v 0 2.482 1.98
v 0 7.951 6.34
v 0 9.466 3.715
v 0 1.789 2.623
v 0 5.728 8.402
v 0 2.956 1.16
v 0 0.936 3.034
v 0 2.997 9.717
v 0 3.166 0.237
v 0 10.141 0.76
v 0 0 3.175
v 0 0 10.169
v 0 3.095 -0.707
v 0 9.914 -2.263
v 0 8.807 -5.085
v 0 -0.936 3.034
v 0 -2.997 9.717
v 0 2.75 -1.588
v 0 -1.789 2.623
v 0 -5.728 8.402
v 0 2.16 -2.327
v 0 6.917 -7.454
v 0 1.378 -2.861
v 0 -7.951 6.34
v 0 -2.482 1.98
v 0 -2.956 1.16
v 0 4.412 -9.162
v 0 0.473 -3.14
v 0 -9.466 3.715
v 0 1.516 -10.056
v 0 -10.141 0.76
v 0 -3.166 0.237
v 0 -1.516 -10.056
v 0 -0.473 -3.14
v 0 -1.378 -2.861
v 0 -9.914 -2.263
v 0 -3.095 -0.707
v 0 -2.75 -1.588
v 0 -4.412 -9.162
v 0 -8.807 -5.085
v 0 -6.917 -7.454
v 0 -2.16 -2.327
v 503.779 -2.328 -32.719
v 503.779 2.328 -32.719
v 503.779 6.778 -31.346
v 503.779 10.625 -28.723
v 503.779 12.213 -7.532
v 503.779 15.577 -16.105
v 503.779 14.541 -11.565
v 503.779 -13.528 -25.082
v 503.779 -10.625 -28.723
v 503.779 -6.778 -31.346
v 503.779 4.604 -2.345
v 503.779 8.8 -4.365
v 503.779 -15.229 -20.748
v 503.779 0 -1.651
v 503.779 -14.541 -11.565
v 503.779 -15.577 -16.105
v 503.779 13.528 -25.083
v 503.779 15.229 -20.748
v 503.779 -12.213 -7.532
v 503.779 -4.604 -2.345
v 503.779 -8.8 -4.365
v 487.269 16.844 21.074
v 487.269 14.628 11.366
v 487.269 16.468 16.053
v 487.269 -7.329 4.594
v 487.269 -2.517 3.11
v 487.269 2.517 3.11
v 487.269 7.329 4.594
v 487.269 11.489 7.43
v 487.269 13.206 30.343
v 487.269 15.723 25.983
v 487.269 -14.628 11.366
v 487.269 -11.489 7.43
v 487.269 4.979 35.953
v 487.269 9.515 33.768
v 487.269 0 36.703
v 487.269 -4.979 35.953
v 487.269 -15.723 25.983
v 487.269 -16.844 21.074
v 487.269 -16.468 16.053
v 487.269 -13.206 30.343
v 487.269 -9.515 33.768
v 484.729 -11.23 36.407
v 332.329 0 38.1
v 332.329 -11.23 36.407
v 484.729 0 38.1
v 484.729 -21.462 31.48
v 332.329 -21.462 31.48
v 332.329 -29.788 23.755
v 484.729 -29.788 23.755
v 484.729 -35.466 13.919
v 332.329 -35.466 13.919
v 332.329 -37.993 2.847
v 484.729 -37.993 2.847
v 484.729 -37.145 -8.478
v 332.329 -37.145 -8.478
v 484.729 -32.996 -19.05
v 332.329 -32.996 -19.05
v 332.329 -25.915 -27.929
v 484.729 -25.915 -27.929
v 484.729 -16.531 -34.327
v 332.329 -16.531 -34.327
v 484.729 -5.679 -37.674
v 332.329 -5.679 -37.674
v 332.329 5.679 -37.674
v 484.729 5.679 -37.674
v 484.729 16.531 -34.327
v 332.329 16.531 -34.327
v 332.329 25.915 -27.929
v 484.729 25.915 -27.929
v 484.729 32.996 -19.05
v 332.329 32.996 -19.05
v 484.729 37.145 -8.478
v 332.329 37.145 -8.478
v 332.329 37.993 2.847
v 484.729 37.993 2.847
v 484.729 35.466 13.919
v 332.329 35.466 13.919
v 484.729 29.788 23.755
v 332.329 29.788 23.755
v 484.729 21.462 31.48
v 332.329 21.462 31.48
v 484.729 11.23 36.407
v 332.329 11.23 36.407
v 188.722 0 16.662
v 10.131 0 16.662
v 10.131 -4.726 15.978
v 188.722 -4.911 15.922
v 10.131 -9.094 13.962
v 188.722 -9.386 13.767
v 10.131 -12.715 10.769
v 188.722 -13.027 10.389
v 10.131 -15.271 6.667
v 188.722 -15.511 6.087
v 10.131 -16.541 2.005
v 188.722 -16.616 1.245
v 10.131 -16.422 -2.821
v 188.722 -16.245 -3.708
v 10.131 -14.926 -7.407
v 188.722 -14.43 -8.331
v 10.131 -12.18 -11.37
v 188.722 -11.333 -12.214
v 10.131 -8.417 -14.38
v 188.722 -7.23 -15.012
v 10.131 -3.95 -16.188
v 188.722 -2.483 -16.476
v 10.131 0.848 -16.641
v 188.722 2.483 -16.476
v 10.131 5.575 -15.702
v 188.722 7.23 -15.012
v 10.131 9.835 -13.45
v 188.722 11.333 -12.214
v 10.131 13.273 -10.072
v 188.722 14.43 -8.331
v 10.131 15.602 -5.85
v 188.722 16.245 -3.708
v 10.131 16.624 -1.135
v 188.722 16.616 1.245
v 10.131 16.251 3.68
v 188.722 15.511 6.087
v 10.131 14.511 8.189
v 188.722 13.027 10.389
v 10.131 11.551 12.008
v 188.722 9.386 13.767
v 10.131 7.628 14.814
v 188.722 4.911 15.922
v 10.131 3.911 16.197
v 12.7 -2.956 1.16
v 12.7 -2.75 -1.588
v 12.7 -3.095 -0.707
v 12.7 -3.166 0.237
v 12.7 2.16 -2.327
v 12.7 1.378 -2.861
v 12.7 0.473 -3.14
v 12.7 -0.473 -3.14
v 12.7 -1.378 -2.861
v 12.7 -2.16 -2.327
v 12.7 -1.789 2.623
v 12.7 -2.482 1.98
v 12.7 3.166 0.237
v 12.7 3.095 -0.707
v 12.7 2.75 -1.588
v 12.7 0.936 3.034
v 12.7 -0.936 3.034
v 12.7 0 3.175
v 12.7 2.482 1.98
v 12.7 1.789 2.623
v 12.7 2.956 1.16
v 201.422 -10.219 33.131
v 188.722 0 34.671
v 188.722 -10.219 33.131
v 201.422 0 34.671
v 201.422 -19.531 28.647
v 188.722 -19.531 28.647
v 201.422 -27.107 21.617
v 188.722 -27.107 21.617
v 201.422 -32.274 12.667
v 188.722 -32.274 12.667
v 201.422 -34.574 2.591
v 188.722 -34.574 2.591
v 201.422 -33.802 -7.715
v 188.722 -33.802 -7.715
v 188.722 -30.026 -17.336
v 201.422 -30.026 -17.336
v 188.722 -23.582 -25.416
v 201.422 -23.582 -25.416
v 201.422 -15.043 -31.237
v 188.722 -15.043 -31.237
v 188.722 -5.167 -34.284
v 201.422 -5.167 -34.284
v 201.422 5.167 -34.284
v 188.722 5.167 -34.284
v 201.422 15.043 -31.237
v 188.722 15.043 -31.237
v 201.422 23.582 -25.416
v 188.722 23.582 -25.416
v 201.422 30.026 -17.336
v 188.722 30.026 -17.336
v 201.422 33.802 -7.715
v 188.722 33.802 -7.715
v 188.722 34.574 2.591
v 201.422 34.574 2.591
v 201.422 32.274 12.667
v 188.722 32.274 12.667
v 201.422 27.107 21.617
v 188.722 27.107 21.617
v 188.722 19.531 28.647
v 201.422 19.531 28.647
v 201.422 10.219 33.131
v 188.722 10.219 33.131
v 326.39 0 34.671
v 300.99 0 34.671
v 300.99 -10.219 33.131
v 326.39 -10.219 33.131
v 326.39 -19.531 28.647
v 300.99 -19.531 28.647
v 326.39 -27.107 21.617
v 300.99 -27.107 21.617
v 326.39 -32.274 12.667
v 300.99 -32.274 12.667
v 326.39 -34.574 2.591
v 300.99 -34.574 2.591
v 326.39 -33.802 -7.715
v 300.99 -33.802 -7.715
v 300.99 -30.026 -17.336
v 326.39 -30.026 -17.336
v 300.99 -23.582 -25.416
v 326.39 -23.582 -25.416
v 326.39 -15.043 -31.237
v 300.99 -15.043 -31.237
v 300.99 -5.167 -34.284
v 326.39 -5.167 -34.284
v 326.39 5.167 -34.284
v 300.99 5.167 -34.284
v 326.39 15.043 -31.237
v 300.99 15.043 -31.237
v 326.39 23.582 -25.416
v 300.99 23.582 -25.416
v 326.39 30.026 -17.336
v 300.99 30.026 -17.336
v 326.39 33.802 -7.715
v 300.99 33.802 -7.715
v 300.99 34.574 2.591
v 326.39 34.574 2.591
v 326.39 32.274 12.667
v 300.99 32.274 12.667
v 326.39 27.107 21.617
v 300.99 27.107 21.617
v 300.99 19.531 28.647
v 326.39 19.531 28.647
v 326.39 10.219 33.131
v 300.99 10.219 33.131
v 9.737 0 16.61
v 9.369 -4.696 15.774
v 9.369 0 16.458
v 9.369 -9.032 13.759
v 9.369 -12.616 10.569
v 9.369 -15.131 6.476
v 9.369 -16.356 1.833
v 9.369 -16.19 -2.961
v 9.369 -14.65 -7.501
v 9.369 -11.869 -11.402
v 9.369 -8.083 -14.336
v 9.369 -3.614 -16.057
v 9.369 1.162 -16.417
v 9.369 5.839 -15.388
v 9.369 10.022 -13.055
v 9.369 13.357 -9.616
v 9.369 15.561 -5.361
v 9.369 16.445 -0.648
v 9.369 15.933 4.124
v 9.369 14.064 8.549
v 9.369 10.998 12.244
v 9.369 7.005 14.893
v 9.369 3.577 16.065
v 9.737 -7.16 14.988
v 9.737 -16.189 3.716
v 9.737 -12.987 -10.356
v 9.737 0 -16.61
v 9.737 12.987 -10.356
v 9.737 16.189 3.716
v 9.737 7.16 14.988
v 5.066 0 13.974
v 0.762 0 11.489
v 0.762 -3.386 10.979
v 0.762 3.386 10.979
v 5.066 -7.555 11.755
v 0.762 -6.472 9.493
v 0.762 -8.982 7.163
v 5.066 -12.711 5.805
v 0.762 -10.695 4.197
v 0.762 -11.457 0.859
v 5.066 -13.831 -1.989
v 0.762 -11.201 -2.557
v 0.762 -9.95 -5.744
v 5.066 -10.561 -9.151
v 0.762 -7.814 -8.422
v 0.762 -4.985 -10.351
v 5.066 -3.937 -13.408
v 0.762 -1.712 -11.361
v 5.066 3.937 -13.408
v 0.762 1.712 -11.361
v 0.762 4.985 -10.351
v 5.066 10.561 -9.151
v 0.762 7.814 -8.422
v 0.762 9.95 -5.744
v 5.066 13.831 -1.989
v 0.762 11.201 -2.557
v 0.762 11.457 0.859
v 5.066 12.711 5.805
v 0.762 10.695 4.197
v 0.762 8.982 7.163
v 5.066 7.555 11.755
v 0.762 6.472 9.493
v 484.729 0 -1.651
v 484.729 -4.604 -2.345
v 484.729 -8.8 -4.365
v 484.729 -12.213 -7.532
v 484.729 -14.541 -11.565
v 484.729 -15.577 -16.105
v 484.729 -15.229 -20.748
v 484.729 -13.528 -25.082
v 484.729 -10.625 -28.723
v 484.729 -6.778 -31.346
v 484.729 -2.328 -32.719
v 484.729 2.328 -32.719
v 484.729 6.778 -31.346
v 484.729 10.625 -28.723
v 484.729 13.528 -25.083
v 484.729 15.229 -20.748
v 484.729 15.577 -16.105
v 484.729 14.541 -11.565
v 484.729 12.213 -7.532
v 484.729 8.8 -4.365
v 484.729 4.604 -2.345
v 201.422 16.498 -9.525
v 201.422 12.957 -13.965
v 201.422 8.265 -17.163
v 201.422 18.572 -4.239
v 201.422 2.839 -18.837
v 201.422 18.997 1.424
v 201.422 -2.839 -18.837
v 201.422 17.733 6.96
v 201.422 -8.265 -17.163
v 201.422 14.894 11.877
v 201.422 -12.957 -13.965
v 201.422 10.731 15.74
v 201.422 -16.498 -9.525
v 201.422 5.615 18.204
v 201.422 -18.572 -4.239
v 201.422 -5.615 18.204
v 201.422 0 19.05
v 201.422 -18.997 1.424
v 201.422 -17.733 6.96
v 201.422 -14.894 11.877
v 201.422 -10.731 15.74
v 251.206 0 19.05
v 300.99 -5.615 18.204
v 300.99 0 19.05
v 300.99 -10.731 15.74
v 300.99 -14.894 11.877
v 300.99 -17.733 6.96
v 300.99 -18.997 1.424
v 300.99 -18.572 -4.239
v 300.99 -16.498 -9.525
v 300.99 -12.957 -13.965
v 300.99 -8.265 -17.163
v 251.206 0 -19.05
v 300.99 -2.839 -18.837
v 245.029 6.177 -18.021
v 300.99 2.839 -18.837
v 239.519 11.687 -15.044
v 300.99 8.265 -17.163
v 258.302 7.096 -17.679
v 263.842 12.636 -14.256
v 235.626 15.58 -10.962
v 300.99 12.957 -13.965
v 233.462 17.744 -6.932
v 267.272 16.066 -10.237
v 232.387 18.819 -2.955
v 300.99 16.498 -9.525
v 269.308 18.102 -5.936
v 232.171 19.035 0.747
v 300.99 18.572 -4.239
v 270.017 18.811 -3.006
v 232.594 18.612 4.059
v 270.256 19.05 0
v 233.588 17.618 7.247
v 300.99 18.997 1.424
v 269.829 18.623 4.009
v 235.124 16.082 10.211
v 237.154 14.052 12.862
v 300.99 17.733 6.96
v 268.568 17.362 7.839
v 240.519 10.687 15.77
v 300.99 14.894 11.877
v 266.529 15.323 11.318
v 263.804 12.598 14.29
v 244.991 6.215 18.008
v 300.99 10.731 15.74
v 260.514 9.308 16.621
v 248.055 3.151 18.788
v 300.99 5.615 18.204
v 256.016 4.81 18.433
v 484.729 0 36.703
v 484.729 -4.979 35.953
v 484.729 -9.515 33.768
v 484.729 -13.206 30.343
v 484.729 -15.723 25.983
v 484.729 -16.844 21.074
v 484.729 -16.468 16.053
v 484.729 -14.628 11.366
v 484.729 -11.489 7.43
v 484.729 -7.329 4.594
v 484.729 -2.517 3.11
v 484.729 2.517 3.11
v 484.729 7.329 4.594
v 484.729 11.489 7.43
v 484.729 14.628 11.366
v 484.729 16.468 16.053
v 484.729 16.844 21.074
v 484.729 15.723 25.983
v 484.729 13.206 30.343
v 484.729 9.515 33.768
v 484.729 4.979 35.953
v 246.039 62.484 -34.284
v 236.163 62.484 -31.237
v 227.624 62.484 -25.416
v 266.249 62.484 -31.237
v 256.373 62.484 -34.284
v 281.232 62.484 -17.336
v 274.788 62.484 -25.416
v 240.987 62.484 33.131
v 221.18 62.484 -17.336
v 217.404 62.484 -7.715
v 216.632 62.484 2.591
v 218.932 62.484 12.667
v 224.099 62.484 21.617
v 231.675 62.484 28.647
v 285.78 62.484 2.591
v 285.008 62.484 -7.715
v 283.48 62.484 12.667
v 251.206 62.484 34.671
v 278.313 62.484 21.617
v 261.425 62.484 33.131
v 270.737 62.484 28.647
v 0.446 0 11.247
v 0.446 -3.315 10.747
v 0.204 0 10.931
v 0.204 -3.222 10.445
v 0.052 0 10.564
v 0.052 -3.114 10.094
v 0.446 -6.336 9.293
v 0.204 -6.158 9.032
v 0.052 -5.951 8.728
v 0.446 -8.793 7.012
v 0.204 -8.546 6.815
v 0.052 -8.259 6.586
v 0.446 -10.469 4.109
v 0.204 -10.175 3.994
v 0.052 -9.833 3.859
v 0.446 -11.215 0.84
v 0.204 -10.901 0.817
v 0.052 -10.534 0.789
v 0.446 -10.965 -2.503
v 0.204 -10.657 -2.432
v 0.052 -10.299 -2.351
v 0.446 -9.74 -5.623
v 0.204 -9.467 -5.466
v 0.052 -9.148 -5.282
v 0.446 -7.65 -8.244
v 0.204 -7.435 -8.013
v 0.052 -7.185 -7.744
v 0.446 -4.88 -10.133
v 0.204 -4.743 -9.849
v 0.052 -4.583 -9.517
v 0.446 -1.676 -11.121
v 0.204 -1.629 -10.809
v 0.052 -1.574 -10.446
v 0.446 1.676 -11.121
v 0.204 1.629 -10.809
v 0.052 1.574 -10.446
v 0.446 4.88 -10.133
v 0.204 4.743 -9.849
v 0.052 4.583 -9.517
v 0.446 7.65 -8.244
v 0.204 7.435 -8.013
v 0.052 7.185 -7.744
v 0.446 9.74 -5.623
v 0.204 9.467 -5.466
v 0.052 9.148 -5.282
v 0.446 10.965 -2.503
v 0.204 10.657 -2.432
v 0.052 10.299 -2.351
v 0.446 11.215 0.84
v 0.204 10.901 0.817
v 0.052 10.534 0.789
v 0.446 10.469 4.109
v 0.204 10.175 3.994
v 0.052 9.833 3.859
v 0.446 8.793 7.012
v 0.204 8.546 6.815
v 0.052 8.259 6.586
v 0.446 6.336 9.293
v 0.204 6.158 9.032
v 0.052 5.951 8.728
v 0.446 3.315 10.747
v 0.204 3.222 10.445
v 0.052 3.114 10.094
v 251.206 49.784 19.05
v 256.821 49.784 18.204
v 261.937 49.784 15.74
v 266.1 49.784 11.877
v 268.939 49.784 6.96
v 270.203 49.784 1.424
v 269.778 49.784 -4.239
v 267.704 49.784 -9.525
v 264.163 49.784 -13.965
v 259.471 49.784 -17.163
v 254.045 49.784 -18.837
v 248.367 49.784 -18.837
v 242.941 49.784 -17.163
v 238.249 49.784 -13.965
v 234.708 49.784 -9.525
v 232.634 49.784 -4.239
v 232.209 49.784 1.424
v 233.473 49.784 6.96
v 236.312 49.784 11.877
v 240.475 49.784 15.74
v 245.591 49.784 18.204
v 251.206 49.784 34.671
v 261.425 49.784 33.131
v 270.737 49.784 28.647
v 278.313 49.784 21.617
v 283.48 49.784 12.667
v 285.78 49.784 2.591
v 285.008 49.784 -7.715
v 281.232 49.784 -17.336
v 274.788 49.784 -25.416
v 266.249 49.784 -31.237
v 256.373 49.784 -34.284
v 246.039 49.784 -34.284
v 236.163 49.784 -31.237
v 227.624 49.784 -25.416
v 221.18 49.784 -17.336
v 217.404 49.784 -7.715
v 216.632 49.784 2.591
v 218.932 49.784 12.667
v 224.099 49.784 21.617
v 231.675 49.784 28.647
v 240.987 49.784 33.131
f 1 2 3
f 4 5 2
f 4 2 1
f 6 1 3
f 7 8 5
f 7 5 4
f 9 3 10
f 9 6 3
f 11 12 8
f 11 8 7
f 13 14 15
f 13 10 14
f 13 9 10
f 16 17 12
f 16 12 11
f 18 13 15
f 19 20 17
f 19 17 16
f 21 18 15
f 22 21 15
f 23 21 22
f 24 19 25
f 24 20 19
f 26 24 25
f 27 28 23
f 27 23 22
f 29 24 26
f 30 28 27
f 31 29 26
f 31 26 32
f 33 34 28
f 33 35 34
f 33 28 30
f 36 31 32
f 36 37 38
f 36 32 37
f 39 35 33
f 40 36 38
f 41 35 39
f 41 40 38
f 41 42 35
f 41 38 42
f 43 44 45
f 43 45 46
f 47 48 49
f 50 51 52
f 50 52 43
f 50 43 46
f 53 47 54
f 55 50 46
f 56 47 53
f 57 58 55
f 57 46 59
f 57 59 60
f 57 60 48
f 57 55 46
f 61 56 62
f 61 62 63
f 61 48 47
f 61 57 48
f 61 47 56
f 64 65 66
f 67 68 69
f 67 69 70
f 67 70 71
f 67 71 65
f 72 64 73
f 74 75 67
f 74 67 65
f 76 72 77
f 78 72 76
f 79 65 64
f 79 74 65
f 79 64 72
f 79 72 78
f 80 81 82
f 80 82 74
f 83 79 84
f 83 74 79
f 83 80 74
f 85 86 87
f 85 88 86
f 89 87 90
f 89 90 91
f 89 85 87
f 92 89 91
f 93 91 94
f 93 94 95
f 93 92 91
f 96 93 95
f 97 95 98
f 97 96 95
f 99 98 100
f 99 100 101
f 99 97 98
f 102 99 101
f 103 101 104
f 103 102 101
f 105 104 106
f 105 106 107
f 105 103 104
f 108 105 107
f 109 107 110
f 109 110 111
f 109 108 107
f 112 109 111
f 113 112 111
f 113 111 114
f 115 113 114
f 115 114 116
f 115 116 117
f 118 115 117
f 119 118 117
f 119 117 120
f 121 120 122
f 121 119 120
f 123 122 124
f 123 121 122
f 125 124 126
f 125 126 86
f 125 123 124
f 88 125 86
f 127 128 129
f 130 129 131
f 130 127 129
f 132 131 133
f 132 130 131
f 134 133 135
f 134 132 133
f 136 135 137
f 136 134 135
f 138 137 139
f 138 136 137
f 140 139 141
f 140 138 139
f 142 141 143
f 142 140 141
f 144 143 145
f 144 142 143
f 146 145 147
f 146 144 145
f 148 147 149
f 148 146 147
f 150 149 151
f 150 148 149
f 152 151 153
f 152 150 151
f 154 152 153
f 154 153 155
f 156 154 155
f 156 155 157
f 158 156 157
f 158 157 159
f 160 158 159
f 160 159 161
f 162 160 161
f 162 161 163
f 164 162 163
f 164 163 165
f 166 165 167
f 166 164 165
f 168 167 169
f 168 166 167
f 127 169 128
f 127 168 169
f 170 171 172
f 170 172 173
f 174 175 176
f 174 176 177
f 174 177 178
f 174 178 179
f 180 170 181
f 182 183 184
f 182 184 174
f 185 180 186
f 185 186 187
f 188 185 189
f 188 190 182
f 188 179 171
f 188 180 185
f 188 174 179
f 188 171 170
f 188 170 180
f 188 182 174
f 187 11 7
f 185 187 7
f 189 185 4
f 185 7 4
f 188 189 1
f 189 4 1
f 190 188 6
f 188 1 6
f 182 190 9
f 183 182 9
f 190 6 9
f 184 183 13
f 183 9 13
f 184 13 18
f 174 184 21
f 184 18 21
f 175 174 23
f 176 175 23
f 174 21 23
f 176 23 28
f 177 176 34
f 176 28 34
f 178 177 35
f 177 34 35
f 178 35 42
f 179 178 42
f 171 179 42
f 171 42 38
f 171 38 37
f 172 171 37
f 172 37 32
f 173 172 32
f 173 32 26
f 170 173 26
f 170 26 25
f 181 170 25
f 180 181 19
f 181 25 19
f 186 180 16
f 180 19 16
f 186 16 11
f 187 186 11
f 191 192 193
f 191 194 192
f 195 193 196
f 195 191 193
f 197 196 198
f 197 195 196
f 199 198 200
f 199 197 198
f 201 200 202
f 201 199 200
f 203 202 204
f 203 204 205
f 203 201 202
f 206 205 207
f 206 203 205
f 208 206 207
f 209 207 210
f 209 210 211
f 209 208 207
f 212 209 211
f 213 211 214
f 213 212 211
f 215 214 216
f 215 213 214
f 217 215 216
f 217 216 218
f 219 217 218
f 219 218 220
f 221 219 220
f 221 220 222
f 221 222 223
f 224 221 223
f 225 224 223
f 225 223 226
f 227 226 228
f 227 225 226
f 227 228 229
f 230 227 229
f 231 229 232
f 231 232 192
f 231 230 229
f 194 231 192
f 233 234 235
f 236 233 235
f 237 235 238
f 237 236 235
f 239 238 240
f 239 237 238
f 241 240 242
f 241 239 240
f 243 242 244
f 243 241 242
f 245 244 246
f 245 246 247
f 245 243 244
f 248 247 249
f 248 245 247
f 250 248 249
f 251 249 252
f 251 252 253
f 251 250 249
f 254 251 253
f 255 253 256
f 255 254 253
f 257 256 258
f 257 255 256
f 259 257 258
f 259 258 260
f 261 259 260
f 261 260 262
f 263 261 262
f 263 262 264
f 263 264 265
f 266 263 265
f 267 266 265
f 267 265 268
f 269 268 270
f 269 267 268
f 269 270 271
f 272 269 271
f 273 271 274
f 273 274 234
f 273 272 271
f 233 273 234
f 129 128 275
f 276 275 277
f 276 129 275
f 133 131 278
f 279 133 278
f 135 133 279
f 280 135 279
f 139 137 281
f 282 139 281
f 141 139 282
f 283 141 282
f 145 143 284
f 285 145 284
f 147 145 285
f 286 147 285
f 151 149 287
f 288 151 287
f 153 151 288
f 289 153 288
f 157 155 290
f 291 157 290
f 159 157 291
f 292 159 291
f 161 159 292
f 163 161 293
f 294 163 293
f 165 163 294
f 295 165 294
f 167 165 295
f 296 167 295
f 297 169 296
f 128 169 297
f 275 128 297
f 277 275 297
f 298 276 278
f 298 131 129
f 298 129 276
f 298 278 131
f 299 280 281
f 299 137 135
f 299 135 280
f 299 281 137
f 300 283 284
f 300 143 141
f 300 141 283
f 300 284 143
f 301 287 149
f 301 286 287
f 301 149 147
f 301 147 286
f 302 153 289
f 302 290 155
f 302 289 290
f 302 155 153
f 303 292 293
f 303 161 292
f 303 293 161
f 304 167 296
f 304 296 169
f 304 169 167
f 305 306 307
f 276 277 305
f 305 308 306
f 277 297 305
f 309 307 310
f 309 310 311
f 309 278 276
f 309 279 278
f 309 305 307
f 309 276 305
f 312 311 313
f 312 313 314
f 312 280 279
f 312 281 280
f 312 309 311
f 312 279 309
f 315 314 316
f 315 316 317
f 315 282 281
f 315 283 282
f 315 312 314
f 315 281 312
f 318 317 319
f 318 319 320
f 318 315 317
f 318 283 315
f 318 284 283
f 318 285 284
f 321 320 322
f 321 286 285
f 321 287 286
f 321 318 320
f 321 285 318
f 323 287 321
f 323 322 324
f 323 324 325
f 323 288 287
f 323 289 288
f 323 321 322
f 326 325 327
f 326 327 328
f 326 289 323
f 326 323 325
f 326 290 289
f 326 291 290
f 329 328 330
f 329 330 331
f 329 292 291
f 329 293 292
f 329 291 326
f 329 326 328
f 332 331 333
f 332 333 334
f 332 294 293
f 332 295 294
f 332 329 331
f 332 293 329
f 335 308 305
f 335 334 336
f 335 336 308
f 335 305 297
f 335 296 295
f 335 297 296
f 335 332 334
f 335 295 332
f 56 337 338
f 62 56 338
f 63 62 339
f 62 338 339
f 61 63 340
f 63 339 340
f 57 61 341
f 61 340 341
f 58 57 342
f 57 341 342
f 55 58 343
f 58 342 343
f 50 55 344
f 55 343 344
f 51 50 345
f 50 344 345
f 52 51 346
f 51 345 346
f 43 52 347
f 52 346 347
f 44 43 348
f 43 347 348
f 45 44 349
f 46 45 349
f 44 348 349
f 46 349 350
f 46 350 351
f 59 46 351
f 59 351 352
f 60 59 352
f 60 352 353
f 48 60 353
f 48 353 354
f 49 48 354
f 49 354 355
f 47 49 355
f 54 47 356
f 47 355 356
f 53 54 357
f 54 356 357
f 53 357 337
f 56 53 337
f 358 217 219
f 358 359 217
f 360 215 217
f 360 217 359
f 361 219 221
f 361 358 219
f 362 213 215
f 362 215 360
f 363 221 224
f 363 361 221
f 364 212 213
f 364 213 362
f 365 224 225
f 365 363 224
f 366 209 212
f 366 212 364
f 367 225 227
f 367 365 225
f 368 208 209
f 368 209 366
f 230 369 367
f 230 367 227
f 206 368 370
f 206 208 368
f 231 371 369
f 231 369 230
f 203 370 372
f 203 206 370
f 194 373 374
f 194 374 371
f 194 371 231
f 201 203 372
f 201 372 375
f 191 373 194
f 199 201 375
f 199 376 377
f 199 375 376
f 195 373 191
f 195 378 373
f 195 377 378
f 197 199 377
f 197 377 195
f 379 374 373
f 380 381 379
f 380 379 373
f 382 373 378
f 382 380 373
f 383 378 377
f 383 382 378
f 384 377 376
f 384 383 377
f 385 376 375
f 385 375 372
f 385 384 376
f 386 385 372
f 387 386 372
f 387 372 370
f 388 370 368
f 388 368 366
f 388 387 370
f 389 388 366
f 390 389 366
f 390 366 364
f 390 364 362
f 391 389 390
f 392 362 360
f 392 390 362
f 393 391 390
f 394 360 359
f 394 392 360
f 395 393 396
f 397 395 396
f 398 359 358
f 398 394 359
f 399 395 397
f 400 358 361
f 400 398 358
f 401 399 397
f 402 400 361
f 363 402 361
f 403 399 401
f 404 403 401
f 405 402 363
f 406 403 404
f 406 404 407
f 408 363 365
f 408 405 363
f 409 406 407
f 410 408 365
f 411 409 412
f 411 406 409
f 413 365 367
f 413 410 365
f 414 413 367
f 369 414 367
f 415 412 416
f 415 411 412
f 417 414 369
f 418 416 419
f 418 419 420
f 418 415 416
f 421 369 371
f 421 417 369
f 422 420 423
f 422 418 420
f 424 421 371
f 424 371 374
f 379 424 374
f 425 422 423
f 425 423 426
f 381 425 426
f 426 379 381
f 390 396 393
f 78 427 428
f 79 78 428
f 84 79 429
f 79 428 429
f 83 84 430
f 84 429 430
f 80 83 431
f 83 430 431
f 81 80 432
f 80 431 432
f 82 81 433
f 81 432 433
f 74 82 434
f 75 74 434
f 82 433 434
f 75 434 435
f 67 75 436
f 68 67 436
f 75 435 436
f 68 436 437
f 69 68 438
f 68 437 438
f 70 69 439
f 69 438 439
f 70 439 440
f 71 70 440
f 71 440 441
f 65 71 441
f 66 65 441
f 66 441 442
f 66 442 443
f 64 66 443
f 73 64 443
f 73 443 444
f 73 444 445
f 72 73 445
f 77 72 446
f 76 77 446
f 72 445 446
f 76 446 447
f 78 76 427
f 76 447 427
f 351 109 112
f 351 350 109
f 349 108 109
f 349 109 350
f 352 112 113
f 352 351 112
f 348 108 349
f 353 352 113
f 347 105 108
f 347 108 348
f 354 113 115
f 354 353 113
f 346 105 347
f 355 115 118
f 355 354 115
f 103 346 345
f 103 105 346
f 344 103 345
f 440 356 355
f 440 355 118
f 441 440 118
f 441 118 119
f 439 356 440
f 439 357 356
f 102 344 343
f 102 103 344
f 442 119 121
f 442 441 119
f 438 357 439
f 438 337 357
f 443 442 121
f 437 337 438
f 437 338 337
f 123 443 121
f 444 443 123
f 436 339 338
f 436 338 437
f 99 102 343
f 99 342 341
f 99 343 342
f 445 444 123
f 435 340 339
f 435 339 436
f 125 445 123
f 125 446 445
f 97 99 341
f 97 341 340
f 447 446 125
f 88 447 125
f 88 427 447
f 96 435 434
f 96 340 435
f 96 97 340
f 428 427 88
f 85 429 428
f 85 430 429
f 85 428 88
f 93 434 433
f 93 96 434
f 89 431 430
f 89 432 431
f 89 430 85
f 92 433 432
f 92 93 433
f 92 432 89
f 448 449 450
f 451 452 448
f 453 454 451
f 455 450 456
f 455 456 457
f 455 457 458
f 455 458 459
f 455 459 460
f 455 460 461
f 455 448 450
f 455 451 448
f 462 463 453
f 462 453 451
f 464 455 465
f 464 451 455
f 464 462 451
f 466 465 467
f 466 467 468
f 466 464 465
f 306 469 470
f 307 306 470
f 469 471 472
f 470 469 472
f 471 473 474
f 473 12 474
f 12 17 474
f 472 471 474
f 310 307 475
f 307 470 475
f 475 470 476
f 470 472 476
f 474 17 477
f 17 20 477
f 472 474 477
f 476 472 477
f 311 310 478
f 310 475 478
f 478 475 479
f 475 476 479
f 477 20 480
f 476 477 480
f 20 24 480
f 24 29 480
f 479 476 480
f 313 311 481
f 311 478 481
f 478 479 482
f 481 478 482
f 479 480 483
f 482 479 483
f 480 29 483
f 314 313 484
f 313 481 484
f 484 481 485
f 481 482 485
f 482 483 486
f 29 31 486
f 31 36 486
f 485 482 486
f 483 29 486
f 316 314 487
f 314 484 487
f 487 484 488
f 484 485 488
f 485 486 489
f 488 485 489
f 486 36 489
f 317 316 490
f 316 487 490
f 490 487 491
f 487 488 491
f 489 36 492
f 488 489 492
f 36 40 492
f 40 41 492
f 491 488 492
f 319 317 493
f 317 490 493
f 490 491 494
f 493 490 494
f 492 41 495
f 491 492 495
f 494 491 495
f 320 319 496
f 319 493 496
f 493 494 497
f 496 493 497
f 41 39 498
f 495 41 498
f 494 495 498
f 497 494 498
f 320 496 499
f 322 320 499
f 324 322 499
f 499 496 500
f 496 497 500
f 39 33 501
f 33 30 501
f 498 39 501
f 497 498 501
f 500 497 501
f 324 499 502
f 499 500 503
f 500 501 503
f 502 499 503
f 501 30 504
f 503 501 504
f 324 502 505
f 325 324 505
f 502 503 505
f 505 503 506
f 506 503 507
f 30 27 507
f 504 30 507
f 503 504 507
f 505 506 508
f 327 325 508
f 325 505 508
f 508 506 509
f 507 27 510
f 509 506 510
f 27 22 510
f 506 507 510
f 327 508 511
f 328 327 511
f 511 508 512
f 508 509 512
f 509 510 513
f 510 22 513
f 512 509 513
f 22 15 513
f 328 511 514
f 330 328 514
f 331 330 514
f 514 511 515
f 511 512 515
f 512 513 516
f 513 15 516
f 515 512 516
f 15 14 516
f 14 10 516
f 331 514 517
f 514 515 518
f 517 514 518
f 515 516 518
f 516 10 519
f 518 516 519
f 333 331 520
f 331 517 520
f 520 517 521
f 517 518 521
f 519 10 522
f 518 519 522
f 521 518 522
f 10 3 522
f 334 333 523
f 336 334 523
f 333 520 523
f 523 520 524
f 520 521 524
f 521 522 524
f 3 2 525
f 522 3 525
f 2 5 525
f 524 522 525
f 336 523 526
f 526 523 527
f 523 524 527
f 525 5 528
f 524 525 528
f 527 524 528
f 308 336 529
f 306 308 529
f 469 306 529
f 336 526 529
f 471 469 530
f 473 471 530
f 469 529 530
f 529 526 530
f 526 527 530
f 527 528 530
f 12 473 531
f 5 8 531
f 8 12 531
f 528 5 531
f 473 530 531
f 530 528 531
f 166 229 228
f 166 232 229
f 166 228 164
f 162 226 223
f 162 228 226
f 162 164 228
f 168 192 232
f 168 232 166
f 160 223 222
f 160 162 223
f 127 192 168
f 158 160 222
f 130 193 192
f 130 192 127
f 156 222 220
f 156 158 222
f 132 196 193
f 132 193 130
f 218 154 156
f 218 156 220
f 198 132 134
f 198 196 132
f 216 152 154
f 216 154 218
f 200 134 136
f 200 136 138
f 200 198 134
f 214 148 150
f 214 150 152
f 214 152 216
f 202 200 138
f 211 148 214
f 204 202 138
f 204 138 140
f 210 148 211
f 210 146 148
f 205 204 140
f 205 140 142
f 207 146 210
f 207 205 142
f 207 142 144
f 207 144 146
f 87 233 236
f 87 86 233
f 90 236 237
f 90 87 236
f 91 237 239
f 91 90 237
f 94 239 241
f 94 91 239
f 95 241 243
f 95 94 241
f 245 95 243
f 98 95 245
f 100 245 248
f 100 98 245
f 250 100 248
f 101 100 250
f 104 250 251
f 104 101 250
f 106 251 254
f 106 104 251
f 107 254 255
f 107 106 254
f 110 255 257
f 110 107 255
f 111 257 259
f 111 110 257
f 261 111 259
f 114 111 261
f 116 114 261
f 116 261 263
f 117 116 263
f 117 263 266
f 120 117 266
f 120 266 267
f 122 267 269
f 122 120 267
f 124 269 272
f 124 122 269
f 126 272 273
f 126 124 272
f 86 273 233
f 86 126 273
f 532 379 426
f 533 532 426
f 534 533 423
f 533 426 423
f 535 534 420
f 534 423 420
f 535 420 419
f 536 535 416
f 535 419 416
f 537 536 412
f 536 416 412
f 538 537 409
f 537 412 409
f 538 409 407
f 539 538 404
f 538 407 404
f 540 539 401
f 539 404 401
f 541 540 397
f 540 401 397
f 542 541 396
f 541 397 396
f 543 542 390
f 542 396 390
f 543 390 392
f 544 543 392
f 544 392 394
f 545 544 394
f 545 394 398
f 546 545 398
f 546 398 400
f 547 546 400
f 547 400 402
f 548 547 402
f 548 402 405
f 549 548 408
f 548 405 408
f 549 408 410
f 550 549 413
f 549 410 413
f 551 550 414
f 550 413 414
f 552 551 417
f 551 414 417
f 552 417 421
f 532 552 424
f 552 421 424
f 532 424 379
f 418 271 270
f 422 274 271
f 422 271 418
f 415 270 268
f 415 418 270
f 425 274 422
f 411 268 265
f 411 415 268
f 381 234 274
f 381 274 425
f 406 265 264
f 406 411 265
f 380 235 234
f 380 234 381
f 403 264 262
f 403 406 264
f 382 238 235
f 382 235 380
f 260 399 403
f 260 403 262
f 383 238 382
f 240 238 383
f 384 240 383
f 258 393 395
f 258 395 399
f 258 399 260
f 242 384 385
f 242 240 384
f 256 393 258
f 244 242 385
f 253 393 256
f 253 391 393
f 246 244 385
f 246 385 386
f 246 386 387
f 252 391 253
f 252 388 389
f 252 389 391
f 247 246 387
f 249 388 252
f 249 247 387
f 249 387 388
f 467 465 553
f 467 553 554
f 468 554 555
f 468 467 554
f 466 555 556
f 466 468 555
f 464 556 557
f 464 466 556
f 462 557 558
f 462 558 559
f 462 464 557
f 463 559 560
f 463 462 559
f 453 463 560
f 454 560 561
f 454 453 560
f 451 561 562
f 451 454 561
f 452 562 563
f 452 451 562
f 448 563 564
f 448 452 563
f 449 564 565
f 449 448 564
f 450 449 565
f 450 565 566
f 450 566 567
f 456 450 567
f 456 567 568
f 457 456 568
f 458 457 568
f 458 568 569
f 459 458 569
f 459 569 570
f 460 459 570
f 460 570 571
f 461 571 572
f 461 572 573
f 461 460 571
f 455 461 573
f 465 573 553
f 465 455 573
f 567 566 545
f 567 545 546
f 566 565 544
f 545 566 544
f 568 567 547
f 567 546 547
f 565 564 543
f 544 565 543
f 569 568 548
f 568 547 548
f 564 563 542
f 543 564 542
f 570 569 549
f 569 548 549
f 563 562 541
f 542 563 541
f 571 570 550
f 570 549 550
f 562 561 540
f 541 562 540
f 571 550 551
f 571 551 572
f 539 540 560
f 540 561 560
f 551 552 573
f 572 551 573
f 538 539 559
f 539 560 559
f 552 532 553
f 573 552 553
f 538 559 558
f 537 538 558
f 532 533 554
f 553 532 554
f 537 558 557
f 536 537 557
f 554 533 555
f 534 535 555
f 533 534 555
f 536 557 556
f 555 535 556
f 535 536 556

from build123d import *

# Parameters (mm, degrees)
SKETCH2_R           = 19.05
BOSS_EXTRUDE1_DEPTH = 62.484
SKETCH3_R           = 34.671
BOSS_EXTRUDE2_DEPTH = 12.7
SKETCH4_R           = 15.621
BOSS_EXTRUDE3_DEPTH = 19.05
SKETCH5_R           = 16.891
BOSS_EXTRUDE4_DEPTH = 2.54
FILLET1_R           = 1.524
SKETCH6_R           = 3.175
CUT_EXTRUDE1_DEPTH  = 12.7


with BuildPart() as part:
    # Sketch1 → Revolve1 (revolve)
    with BuildSketch(Plane.XY, mode=Mode.PRIVATE) as revolve1_sk:
        Polygon((0, 0), (0, 11.049), (9.722694003, 16.6624), (188.722, 16.6624), (188.722, 34.671), (201.422, 34.671), (201.422, 19.05), (300.99, 19.05), (300.99, 34.671), (326.39, 34.671), (332.329202219, 38.1), (484.729202219, 38.1), (484.729202219, 0), align=None)
    revolve(revolve1_sk.sketch.rotate(Axis((0, 0, 0), (1, 0, 0)), 90), axis=Axis((0, 0, 0), (1, 0, 0)))  # turned: the seam where the file's is

    # Sketch2 → Boss-Extrude1 (add)
    with BuildSketch(Plane(origin=(0, 0, 0), x_dir=(1, 0, 0), z_dir=(0, 1, 0))):
        with Locations(Location((251.206, 0, 0), (0, 0, 270))):  # turned: the seam where the file's is
            Circle(SKETCH2_R)
    extrude(amount=BOSS_EXTRUDE1_DEPTH)

    # Sketch3 → Boss-Extrude2 (add)
    with BuildSketch(Plane(origin=(0, 62.484, 0), x_dir=(1, 0, 0), z_dir=(0, 1, 0))):
        with Locations(Location((251.206, 0, 0), (0, 0, 270))):  # turned: the seam where the file's is
            Circle(SKETCH3_R)
    extrude(amount=-BOSS_EXTRUDE2_DEPTH)

    # Sketch4 → Boss-Extrude3 (add)
    with BuildSketch(Plane(origin=(484.729202219, 0, 0), x_dir=(0, 0, -1), z_dir=(1, 0, 0))):
        with Locations(Location((17.272, 0, 0), (0, 0, 180))):  # turned: the seam where the file's is
            Circle(SKETCH4_R)
    extrude(amount=BOSS_EXTRUDE3_DEPTH)

    # Sketch5 → Boss-Extrude4 (add)
    with BuildSketch(Plane(origin=(484.729202219, 0, 0), x_dir=(0, 0, -1), z_dir=(1, 0, 0))):
        with Locations(Location((-19.812, 0, 0), (0, 0, 180))):  # turned: the seam where the file's is
            Circle(SKETCH5_R)
    extrude(amount=BOSS_EXTRUDE4_DEPTH)

    # Fillet1
    fillet1_edges = [part.edges().sort_by_distance(p)[0] for p in [
        (9.722694003, 0, -16.6624),
        (0, 0, -11.049),
    ]]
    fillet(fillet1_edges, radius=FILLET1_R)

    # Sketch6 → Cut-Extrude1 (cut)
    with BuildSketch(Plane.ZY):
        Circle(SKETCH6_R)
    extrude(amount=-CUT_EXTRUDE1_DEPTH, mode=Mode.SUBTRACT)


solid = part.part
